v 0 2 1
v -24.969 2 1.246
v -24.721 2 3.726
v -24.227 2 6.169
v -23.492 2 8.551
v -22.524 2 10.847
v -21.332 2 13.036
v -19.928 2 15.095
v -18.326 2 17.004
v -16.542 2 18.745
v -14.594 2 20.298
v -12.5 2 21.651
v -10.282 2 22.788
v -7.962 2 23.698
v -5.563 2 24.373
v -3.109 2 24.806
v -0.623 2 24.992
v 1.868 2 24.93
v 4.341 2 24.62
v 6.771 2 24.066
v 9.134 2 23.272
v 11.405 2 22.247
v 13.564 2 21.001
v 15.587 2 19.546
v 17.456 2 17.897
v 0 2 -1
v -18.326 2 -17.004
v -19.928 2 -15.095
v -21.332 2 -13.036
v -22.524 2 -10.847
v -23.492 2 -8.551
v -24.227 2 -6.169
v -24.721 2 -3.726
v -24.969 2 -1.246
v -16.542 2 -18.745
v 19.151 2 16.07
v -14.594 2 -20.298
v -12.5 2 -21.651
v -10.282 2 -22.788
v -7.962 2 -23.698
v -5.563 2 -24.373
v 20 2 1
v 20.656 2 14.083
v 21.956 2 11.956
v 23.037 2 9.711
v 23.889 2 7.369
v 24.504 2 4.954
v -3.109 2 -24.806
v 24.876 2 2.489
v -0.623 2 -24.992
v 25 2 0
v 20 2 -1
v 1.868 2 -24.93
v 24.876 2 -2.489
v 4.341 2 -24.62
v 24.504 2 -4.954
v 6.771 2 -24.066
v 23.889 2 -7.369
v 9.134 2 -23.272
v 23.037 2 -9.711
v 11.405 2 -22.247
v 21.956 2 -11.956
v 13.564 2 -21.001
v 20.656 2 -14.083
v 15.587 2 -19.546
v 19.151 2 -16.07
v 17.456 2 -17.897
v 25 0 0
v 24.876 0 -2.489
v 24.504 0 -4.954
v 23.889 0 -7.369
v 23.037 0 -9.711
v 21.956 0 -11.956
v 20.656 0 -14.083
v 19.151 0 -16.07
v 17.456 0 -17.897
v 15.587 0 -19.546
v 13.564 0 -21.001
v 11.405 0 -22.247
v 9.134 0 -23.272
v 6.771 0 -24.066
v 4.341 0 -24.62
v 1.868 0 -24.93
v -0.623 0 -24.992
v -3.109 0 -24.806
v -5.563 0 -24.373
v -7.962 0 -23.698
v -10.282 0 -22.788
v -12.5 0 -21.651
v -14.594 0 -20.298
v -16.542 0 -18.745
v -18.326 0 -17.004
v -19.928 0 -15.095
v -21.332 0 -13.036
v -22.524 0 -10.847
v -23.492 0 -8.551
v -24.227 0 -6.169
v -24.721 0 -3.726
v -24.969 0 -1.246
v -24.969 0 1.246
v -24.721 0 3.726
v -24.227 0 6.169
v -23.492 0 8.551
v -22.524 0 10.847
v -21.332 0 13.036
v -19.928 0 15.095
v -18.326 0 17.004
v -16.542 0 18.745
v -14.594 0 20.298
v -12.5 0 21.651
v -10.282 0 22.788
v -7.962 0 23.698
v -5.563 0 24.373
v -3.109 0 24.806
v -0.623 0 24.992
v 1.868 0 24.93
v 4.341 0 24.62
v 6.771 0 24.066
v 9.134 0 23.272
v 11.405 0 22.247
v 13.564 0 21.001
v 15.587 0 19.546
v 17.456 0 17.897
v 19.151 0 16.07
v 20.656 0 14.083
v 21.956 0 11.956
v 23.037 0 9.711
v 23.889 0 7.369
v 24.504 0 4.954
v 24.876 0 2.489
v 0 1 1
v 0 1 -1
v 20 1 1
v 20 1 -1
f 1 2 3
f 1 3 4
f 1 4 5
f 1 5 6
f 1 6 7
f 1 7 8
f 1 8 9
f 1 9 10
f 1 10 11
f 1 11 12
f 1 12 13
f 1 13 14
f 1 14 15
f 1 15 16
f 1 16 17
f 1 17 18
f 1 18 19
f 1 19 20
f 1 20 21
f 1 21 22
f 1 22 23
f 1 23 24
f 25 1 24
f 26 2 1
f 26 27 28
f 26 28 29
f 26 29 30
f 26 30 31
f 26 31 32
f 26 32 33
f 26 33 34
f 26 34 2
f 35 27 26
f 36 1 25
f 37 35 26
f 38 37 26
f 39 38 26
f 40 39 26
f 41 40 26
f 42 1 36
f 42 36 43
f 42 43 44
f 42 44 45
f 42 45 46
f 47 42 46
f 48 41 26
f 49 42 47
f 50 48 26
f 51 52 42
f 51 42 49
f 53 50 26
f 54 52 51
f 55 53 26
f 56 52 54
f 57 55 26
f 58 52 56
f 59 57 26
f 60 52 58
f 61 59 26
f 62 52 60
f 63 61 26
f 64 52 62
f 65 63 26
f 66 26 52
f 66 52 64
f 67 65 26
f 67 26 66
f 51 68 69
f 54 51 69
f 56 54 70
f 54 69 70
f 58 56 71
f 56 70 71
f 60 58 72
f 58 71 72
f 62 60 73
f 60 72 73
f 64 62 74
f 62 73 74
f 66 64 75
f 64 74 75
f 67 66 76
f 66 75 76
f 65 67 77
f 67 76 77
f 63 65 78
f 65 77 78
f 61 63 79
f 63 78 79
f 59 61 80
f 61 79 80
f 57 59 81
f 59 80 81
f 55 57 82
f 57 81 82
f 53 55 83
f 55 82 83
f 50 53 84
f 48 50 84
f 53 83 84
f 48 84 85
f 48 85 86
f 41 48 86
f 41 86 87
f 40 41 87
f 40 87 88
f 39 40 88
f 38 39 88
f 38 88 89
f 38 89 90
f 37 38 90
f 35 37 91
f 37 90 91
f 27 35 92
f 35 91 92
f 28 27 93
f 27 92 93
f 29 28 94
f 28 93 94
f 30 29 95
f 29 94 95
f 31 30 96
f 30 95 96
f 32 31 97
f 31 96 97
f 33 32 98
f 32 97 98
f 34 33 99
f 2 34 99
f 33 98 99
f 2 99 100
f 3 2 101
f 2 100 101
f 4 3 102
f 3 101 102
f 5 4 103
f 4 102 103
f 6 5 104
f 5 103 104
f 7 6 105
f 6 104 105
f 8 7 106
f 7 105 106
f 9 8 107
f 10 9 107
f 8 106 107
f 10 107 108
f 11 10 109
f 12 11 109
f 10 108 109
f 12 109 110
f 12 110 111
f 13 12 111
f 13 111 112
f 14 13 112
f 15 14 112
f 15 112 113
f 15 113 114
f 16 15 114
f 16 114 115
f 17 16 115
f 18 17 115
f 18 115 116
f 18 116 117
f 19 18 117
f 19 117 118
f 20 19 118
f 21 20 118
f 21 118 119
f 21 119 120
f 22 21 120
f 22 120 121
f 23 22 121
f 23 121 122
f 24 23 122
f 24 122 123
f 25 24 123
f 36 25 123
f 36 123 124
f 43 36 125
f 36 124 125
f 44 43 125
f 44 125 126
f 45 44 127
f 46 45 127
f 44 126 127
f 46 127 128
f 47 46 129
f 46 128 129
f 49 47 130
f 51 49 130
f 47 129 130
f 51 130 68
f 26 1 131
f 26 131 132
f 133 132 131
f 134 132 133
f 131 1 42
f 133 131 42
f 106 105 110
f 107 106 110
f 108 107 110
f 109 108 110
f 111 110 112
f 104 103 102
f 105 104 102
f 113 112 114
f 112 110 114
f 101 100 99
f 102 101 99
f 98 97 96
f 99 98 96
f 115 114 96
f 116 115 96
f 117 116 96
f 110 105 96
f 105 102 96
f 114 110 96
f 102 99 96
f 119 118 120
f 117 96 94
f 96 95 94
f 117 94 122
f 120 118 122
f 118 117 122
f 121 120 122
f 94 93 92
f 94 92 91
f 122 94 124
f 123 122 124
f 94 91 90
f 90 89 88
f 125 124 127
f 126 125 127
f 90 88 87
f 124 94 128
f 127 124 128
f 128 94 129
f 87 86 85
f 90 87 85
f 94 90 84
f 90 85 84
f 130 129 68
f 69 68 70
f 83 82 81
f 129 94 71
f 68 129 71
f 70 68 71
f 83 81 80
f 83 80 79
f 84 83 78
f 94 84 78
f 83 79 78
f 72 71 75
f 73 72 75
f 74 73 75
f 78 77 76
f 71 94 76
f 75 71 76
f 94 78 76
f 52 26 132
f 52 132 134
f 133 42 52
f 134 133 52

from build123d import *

# Parameters (mm, degrees)
SKETCH1_R                    = 25
BOSS_EXTRUDE1_DEPTH          = 2
SKETCH2_W                    = 20
SKETCH2_H                    = 2
CUT_EXTRUDE_THIN1_DEPTH      = 1
CUT_EXTRUDE_THIN1_DEPTH_BACK = 1


with BuildPart() as part:
    # Sketch1 → Boss-Extrude1 (new body)
    with BuildSketch(Plane(origin=(0, 0, 0), x_dir=(1, 0, 0), z_dir=(0, 1, 0))):
        Circle(SKETCH1_R)
    extrude(amount=BOSS_EXTRUDE1_DEPTH)

    # Sketch2 → Cut-Extrude-Thin1 (cut, two sides)
    with BuildSketch(Plane(origin=(0, 2, 0), x_dir=(1, 0, 0), z_dir=(0, 1, 0))) as cut_extrude_thin1_sk:
        with Locations((10, 0)):
            Rectangle(SKETCH2_W, SKETCH2_H)
    extrude(amount=CUT_EXTRUDE_THIN1_DEPTH, mode=Mode.SUBTRACT)
    extrude(cut_extrude_thin1_sk.sketch, amount=-CUT_EXTRUDE_THIN1_DEPTH_BACK, mode=Mode.SUBTRACT)


solid = part.part
